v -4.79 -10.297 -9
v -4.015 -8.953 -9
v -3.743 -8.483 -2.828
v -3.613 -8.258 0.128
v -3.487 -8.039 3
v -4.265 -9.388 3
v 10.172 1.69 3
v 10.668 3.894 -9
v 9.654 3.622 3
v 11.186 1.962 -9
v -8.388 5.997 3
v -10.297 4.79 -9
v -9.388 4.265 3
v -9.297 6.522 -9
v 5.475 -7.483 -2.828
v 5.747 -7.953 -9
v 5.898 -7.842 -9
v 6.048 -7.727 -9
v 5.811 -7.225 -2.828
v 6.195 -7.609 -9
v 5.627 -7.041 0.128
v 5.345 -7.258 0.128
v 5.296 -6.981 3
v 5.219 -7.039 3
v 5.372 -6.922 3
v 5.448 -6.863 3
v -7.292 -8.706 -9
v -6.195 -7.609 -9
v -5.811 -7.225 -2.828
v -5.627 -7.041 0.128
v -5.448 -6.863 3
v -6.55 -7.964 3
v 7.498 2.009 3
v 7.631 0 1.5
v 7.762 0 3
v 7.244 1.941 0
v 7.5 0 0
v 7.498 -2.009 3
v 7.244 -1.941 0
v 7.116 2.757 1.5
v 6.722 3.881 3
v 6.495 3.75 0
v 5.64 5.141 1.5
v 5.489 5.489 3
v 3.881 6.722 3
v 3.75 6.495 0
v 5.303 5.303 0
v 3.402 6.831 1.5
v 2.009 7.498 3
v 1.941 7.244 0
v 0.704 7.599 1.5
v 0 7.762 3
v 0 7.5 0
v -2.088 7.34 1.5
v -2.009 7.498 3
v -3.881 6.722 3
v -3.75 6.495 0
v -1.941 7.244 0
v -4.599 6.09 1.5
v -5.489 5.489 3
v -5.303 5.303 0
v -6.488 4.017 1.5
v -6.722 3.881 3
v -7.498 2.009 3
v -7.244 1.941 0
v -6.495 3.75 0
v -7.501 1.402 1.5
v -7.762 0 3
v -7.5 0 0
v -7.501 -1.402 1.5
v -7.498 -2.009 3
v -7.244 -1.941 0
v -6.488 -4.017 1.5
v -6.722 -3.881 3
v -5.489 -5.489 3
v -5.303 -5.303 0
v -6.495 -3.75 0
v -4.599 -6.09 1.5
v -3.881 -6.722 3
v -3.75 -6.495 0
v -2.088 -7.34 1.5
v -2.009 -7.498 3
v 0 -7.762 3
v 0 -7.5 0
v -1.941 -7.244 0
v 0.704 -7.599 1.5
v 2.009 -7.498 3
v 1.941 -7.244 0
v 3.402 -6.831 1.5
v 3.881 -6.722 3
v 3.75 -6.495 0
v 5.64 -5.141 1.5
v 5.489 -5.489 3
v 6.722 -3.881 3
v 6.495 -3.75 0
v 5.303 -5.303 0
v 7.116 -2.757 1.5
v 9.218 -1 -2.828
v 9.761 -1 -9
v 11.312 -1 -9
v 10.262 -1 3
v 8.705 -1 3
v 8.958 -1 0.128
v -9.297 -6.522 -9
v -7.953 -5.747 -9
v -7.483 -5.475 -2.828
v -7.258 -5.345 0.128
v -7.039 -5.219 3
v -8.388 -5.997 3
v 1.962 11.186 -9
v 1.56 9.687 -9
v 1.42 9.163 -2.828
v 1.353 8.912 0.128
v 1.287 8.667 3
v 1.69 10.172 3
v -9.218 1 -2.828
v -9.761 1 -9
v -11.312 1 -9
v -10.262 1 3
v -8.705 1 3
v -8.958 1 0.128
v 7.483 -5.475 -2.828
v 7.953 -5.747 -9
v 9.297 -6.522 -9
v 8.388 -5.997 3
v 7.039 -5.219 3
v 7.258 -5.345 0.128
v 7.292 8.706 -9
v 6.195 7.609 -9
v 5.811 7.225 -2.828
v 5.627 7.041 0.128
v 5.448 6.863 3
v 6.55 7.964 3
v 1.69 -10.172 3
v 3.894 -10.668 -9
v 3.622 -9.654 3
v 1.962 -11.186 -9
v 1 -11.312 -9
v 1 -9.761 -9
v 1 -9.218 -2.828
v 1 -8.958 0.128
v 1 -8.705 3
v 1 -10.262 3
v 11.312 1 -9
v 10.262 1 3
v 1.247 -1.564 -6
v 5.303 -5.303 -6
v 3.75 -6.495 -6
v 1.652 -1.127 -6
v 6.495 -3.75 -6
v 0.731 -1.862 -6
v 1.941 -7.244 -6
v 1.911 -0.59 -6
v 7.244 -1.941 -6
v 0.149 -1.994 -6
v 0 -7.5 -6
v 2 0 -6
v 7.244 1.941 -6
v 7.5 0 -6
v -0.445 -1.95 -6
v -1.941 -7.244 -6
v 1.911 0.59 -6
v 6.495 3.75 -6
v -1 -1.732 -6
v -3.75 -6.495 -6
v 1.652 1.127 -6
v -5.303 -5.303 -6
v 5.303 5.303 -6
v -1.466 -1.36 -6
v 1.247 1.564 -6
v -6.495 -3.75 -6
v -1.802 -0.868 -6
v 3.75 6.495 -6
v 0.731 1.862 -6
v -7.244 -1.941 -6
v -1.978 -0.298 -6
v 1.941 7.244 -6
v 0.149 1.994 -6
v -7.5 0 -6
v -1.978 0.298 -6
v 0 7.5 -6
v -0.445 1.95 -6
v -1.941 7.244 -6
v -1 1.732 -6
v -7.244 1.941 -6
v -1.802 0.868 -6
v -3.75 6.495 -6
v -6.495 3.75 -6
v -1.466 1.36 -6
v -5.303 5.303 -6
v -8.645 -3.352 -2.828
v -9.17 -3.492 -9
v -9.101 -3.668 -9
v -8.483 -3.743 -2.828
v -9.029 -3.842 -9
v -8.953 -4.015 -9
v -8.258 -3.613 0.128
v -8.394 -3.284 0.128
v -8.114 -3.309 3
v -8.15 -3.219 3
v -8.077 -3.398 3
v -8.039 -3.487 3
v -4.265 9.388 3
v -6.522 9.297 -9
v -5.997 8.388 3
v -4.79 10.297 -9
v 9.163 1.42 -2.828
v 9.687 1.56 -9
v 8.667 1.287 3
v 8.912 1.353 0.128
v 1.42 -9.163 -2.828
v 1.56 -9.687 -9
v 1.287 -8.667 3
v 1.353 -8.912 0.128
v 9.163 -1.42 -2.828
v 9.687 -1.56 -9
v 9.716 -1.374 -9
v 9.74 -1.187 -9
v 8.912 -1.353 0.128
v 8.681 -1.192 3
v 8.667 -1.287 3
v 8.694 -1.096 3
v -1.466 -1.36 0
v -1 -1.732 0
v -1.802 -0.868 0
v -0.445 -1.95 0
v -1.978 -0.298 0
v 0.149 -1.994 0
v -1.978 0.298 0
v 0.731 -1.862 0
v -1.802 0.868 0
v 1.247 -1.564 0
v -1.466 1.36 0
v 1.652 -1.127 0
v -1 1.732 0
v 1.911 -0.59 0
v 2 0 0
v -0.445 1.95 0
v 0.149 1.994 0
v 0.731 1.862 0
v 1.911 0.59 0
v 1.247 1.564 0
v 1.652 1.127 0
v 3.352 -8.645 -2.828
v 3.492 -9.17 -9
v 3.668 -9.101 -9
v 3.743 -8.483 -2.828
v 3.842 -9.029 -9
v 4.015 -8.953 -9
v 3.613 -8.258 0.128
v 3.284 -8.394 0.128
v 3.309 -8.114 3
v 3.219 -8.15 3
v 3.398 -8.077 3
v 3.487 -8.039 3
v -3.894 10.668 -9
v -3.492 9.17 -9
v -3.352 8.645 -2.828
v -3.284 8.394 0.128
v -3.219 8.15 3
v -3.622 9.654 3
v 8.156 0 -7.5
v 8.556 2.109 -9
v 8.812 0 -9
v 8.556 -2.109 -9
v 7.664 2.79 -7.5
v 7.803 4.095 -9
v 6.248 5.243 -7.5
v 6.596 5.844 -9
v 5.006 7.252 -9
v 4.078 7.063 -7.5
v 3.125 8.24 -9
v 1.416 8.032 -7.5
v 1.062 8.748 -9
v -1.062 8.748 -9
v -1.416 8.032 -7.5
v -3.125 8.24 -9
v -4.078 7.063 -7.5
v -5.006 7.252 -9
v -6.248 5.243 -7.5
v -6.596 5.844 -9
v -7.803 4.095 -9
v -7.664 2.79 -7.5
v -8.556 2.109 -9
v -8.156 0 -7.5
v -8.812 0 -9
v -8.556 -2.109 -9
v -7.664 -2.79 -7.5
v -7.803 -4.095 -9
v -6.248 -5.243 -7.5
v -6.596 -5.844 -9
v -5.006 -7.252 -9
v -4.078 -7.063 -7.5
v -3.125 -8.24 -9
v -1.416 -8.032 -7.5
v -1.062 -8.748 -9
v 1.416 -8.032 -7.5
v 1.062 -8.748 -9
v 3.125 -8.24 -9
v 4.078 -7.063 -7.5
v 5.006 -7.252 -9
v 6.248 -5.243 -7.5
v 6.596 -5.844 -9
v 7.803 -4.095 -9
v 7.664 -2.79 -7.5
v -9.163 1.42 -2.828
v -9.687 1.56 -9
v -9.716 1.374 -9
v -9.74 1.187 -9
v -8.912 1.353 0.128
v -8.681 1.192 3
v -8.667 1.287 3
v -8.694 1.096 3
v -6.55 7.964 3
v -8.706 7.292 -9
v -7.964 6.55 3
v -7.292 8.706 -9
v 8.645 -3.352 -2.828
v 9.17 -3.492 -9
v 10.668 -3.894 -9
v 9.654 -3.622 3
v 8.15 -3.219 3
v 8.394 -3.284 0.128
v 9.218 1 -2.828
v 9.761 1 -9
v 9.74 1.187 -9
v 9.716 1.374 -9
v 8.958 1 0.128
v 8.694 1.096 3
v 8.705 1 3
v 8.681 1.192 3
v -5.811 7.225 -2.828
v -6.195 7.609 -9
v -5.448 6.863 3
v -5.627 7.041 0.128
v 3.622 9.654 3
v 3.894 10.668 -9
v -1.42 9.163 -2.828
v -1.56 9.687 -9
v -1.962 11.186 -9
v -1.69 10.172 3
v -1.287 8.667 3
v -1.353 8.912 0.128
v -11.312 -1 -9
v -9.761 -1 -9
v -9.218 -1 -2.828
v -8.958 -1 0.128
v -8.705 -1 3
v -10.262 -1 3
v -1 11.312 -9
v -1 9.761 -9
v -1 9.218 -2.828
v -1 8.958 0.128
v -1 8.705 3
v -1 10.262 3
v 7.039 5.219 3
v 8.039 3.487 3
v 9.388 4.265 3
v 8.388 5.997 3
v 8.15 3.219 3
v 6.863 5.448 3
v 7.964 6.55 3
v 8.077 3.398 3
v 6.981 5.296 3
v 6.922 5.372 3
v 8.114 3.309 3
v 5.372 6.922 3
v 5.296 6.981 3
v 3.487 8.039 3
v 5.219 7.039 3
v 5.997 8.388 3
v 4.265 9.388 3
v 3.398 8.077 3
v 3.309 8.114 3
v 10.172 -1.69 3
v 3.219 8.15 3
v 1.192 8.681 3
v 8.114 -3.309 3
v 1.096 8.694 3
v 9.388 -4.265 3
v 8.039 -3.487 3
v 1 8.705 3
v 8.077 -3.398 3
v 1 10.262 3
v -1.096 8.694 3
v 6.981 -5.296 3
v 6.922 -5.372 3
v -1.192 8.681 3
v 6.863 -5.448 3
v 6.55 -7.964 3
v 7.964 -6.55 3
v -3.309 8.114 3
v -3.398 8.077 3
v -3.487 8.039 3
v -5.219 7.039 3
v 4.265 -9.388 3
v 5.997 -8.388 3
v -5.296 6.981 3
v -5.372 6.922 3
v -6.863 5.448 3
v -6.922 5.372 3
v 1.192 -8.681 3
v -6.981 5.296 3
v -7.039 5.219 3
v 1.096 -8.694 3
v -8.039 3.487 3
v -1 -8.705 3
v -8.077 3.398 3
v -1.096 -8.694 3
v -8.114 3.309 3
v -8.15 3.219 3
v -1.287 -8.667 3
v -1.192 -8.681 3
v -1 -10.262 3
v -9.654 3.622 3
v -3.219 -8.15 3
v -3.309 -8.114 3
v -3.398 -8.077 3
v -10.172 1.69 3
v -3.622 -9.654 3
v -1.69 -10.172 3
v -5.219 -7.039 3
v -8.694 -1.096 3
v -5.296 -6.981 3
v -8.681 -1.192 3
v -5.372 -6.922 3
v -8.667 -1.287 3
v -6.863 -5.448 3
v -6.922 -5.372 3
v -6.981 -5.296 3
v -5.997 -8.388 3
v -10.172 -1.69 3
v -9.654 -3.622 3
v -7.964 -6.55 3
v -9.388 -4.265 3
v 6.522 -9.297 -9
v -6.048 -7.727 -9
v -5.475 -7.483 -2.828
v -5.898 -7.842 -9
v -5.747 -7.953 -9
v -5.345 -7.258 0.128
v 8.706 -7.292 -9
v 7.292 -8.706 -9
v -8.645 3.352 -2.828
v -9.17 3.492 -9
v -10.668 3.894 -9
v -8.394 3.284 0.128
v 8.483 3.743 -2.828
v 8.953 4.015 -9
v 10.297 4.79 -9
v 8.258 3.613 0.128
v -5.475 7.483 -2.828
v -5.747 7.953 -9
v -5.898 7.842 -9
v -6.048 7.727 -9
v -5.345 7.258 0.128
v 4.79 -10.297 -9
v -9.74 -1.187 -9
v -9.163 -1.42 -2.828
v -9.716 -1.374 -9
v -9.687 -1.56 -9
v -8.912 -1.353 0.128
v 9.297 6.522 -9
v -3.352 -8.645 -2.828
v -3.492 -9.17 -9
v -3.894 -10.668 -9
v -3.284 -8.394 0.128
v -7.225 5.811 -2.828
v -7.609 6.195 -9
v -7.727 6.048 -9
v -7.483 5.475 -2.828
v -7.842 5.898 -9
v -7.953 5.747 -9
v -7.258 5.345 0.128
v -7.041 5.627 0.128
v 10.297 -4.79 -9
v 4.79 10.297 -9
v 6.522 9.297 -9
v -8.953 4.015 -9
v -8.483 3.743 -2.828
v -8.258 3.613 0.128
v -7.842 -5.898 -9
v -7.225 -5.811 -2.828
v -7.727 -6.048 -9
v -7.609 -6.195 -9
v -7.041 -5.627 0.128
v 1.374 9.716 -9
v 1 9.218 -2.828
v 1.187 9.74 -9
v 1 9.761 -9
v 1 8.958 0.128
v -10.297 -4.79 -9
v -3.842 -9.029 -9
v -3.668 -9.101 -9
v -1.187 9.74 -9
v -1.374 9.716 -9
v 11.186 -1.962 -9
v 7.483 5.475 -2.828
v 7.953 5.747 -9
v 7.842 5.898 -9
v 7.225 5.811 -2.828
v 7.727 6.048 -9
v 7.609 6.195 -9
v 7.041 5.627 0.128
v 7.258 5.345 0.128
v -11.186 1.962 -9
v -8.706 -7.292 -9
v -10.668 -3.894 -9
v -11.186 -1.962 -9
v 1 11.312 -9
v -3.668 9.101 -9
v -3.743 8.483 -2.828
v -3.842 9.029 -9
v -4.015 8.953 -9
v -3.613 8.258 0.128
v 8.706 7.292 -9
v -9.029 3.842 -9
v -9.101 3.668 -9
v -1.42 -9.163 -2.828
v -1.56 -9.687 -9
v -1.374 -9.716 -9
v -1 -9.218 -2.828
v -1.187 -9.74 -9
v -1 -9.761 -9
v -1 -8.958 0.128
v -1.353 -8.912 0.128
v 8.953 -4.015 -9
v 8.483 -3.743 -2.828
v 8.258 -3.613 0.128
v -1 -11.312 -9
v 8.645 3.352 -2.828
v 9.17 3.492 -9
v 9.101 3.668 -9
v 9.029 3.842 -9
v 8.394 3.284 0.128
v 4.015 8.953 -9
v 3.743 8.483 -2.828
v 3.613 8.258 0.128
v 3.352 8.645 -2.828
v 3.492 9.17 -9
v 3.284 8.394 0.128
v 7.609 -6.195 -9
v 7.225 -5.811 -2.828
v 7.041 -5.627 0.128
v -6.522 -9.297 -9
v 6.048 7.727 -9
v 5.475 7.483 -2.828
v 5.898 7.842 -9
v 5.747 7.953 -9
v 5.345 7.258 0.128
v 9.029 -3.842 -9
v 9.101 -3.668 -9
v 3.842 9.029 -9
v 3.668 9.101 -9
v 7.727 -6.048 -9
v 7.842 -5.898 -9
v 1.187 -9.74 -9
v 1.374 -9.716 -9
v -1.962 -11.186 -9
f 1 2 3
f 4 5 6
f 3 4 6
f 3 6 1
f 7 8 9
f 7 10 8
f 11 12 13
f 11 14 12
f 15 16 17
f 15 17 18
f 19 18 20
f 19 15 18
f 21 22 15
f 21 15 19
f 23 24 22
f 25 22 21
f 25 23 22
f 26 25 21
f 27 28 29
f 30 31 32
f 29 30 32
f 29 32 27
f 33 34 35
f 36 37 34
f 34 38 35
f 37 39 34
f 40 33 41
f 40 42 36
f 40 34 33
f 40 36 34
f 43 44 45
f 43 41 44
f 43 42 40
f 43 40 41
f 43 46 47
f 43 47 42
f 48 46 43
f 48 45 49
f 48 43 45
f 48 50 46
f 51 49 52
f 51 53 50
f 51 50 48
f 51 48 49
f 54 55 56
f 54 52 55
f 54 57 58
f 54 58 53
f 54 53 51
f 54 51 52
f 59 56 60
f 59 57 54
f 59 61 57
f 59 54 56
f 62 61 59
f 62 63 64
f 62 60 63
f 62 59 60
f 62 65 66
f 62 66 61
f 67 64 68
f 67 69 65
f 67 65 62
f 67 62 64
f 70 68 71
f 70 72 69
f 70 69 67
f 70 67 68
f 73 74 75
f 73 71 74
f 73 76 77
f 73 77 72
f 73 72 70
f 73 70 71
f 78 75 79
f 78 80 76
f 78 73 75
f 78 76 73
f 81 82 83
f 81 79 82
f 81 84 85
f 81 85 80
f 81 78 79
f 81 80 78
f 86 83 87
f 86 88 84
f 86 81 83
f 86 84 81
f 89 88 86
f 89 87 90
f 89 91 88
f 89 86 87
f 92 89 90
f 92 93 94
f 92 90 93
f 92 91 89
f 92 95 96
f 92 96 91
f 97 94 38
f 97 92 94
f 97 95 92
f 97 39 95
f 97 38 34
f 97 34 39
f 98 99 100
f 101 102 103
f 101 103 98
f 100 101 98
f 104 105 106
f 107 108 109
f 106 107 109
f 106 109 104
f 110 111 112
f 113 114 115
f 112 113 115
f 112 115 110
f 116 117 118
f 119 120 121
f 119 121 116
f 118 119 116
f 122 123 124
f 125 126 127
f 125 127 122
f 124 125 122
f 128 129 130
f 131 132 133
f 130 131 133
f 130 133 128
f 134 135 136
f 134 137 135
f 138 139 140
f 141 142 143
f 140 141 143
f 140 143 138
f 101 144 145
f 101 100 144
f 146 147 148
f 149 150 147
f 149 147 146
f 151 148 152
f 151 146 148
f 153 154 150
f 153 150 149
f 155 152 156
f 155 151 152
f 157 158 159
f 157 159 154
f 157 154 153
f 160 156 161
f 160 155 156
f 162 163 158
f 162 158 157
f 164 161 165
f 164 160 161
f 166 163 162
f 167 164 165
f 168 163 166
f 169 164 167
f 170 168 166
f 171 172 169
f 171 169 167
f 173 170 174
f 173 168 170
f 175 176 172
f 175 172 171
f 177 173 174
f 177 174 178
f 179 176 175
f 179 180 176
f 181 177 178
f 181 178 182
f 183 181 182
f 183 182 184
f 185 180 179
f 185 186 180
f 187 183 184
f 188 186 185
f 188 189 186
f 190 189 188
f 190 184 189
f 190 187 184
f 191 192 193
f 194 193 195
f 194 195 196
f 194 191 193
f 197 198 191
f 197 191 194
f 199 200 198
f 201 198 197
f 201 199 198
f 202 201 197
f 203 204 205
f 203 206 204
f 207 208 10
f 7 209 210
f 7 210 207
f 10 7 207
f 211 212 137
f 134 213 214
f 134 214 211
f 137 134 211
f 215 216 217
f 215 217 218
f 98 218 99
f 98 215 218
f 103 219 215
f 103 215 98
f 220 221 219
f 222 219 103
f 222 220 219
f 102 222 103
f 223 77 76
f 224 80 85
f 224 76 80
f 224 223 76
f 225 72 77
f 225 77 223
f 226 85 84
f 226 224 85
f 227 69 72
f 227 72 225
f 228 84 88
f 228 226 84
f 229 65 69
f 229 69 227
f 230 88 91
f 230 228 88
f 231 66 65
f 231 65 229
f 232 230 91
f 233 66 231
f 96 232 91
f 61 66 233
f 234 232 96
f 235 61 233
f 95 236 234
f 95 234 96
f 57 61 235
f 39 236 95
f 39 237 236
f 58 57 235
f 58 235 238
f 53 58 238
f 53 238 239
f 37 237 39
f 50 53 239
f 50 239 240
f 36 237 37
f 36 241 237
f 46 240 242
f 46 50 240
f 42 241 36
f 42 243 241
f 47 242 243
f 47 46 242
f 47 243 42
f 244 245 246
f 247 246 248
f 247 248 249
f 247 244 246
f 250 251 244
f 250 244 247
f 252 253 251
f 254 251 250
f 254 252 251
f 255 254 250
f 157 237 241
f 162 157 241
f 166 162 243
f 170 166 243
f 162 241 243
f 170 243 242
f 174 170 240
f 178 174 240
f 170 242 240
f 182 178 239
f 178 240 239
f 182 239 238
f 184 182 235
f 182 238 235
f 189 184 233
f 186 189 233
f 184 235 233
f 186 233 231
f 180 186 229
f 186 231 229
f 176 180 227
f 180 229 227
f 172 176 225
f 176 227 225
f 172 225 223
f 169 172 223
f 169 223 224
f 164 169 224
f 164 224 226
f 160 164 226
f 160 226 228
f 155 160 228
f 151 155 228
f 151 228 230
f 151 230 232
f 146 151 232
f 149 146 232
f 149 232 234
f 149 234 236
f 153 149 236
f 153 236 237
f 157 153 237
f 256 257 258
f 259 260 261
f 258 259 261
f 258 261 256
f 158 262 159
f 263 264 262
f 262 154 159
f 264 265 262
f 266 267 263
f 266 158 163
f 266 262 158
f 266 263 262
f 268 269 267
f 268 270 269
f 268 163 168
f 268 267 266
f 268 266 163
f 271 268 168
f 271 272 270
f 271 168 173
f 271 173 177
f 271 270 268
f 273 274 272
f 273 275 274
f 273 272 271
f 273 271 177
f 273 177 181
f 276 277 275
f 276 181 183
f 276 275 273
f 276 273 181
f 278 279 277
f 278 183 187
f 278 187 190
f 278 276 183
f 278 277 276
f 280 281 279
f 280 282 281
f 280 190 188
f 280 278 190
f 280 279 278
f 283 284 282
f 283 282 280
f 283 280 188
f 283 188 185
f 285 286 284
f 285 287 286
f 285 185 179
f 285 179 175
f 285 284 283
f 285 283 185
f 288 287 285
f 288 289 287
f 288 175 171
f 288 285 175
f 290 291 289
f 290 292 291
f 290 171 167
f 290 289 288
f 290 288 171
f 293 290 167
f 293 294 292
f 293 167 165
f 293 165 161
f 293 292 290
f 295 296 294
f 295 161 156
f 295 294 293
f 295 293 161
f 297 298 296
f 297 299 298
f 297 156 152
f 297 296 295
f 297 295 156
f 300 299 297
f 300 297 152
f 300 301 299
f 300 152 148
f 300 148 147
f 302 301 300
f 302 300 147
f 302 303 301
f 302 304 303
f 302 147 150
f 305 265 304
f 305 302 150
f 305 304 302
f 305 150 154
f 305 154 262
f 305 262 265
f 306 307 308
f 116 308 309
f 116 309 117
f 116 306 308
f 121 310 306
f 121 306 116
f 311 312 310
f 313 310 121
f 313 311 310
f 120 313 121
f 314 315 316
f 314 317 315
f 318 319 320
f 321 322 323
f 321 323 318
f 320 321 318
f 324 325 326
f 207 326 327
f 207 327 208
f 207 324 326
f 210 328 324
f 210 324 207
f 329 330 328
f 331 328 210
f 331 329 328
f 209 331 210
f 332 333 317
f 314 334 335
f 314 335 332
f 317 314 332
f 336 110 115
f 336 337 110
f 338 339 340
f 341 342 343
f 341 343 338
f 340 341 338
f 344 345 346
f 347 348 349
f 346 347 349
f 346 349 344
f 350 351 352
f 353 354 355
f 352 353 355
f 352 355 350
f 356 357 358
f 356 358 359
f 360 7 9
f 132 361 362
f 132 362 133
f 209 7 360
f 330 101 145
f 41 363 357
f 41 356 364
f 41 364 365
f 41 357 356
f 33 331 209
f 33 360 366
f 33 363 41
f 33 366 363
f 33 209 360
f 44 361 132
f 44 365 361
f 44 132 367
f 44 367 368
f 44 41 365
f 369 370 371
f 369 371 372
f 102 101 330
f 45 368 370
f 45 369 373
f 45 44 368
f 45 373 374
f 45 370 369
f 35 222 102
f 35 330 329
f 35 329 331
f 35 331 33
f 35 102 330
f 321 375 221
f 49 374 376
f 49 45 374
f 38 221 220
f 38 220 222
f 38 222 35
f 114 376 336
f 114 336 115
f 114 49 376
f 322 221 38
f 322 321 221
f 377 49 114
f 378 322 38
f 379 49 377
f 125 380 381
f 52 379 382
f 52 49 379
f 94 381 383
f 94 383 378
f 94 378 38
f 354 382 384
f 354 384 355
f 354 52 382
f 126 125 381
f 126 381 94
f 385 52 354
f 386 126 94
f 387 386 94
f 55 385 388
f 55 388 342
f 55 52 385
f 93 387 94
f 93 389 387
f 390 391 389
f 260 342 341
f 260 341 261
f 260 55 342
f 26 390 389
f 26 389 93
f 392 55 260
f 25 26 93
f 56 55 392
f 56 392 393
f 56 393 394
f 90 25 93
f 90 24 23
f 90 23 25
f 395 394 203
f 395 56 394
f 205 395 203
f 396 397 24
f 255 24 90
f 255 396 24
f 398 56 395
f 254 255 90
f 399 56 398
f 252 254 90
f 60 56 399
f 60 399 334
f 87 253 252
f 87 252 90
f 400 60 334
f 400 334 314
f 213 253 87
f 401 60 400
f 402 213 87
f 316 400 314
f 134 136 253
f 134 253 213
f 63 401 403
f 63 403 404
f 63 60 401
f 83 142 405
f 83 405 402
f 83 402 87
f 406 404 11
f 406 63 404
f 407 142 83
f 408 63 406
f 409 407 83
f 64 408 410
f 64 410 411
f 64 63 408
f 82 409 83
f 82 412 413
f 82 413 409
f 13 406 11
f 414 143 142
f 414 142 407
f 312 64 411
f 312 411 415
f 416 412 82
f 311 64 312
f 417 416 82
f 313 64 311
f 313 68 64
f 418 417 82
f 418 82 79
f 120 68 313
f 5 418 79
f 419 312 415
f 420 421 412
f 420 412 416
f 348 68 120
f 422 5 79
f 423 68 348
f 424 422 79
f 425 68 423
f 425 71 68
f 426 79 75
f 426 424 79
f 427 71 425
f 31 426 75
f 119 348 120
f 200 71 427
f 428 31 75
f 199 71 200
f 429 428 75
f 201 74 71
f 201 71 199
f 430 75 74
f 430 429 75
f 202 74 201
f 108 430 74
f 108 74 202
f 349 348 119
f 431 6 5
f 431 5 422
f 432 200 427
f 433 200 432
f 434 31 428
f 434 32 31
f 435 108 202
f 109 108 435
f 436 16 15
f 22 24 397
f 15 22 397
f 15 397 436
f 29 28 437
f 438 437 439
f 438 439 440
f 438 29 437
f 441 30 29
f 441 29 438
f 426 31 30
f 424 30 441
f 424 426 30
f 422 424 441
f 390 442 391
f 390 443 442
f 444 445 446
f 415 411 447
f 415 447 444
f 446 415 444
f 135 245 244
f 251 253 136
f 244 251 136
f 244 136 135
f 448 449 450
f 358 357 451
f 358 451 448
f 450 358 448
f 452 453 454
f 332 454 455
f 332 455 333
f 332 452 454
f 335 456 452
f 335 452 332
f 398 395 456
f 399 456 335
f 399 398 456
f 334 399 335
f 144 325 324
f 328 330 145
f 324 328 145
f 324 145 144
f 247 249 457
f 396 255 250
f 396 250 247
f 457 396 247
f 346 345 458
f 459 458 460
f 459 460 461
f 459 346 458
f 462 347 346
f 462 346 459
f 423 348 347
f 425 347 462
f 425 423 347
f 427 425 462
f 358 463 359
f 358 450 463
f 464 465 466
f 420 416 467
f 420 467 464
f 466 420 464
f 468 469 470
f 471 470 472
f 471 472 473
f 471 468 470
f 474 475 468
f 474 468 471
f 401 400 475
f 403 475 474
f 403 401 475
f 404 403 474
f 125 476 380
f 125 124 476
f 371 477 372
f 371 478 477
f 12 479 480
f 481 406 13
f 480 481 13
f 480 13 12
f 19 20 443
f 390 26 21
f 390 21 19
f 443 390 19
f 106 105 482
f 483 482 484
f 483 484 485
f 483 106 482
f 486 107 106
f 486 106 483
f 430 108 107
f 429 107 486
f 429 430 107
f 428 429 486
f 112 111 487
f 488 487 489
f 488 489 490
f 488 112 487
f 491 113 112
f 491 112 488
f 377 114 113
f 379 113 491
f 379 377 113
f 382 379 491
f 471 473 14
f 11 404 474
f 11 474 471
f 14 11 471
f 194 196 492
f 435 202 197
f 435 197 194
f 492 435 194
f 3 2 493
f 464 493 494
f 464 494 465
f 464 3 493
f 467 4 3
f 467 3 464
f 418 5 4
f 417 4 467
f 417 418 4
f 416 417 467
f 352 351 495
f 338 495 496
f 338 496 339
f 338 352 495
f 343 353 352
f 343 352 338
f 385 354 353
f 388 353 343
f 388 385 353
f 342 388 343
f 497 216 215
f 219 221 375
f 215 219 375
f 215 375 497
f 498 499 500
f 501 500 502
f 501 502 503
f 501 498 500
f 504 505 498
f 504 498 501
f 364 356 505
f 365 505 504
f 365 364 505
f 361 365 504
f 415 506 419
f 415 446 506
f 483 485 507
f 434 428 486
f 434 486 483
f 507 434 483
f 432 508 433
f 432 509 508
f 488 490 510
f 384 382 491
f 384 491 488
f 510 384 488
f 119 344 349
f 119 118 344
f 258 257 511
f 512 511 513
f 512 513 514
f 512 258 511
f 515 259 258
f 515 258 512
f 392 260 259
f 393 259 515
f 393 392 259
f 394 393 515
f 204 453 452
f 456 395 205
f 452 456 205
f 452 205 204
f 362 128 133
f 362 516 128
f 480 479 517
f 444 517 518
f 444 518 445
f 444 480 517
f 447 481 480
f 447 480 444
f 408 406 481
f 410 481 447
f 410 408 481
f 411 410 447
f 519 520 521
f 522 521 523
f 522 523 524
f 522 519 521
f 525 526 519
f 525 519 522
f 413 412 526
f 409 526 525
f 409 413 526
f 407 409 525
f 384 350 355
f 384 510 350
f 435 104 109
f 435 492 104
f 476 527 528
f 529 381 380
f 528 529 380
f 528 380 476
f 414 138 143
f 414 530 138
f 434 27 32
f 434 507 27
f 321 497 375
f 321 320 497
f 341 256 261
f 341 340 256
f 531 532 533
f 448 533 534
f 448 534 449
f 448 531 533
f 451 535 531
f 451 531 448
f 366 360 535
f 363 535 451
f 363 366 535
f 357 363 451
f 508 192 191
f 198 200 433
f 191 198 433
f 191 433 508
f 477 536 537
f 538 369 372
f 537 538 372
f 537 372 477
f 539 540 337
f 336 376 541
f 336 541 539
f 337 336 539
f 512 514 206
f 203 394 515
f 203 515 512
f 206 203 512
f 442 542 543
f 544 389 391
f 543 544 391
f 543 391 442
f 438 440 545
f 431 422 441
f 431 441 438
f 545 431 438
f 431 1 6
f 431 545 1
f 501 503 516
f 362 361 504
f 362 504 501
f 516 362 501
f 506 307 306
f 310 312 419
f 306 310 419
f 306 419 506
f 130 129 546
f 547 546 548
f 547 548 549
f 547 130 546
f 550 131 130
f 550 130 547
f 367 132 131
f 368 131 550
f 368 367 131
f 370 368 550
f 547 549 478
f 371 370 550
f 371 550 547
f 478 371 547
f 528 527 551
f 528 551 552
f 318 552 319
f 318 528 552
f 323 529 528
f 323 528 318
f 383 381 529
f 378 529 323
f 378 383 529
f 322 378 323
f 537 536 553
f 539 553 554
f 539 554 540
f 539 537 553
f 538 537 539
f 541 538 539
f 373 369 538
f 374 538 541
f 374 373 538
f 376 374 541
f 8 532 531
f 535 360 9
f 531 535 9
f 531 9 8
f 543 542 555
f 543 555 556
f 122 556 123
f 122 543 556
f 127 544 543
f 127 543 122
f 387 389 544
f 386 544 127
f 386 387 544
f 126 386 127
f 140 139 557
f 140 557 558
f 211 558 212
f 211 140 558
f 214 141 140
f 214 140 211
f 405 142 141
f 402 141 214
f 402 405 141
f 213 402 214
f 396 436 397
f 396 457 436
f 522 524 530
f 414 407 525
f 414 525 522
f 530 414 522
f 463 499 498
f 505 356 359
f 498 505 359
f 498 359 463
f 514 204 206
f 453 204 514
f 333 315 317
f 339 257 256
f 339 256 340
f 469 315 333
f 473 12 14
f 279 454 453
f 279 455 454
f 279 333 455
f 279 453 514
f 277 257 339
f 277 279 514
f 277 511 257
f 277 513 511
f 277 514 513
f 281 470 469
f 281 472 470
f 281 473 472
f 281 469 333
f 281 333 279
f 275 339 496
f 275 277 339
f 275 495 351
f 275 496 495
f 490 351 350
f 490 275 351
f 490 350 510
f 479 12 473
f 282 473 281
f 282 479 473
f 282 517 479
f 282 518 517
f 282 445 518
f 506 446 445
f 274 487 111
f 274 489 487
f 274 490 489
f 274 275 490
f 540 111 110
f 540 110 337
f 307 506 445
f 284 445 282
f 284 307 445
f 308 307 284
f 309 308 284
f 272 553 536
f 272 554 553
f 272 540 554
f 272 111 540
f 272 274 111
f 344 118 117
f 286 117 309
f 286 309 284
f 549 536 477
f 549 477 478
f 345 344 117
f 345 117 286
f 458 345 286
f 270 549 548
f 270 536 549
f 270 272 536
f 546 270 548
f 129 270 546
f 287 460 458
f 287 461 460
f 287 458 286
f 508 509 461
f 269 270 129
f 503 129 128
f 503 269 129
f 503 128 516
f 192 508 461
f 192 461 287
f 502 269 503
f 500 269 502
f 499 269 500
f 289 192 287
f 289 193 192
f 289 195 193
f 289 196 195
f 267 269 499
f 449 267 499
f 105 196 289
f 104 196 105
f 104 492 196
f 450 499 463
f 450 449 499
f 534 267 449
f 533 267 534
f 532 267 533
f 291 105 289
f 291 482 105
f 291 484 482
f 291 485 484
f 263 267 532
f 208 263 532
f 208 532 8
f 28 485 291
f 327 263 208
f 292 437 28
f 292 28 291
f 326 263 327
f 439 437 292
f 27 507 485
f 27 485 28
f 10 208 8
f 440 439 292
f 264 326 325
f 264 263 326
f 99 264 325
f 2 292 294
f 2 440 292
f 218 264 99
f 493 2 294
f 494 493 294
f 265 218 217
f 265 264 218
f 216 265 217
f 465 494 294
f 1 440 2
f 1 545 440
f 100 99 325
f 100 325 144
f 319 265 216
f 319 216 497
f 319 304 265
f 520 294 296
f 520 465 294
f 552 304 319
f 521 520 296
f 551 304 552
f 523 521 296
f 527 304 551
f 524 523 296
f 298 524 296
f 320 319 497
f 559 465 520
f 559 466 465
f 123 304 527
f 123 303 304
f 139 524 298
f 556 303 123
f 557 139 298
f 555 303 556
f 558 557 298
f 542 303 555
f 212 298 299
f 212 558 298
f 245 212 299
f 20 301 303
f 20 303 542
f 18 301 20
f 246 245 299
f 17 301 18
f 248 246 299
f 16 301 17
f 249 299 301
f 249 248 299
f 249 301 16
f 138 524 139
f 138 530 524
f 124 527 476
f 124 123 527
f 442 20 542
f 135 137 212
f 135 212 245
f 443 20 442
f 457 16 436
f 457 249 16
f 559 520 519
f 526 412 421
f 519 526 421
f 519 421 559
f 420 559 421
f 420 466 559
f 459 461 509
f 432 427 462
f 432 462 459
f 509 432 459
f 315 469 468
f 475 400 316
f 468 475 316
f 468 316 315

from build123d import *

# Parameters (mm, degrees)
F3_DEPTH      = 1
F3_DEPTH_BACK = 1
F4_COUNT      = 24
F4_ANGLE      = 345
F5_R          = 2
F6_DEPTH      = 25


with BuildPart() as f1:
    # F0 (on Front) → F1 (revolve)
    with BuildSketch(Plane.XZ):
        Polygon((7.5, 0), (0, 0), (0, -6), (7.5, -6), (8.8123299529, -9), (9.8123299529, -9), (8.7624659906, 3), (7.7624659906, 3), align=None)
    revolve(axis=Axis((0, 0, -3), (0, 0, 1)))

    # F2 (on Front) → F3 (join, two sides)
    with BuildSketch(Plane.XZ) as f3_sk:
        Polygon((10.2624659906, 3), (8.7624659906, 3), (7.7624659906, 3), (8.8123299529, -9), (9.8123299529, -9), (11.3123299529, -9), align=None)
    extrude(amount=F3_DEPTH)
    extrude(f3_sk.sketch, amount=-F3_DEPTH_BACK)

    # F4: F1 ×24 about axis
    f4_axis = Axis((0, 0, 3), (0, 0, 1))


with BuildPart() as f1_1:
    add(f1.part)
    for i in range(1, F4_COUNT):
        add(f1.part.rotate(f4_axis, i * F4_ANGLE / (F4_COUNT - 1)))

    # F5 (on face) → F6 (cut)
    with BuildSketch(Plane.XY):
        Circle(F5_R)
    extrude(amount=-F6_DEPTH, mode=Mode.SUBTRACT)


solid = f1_1.part
